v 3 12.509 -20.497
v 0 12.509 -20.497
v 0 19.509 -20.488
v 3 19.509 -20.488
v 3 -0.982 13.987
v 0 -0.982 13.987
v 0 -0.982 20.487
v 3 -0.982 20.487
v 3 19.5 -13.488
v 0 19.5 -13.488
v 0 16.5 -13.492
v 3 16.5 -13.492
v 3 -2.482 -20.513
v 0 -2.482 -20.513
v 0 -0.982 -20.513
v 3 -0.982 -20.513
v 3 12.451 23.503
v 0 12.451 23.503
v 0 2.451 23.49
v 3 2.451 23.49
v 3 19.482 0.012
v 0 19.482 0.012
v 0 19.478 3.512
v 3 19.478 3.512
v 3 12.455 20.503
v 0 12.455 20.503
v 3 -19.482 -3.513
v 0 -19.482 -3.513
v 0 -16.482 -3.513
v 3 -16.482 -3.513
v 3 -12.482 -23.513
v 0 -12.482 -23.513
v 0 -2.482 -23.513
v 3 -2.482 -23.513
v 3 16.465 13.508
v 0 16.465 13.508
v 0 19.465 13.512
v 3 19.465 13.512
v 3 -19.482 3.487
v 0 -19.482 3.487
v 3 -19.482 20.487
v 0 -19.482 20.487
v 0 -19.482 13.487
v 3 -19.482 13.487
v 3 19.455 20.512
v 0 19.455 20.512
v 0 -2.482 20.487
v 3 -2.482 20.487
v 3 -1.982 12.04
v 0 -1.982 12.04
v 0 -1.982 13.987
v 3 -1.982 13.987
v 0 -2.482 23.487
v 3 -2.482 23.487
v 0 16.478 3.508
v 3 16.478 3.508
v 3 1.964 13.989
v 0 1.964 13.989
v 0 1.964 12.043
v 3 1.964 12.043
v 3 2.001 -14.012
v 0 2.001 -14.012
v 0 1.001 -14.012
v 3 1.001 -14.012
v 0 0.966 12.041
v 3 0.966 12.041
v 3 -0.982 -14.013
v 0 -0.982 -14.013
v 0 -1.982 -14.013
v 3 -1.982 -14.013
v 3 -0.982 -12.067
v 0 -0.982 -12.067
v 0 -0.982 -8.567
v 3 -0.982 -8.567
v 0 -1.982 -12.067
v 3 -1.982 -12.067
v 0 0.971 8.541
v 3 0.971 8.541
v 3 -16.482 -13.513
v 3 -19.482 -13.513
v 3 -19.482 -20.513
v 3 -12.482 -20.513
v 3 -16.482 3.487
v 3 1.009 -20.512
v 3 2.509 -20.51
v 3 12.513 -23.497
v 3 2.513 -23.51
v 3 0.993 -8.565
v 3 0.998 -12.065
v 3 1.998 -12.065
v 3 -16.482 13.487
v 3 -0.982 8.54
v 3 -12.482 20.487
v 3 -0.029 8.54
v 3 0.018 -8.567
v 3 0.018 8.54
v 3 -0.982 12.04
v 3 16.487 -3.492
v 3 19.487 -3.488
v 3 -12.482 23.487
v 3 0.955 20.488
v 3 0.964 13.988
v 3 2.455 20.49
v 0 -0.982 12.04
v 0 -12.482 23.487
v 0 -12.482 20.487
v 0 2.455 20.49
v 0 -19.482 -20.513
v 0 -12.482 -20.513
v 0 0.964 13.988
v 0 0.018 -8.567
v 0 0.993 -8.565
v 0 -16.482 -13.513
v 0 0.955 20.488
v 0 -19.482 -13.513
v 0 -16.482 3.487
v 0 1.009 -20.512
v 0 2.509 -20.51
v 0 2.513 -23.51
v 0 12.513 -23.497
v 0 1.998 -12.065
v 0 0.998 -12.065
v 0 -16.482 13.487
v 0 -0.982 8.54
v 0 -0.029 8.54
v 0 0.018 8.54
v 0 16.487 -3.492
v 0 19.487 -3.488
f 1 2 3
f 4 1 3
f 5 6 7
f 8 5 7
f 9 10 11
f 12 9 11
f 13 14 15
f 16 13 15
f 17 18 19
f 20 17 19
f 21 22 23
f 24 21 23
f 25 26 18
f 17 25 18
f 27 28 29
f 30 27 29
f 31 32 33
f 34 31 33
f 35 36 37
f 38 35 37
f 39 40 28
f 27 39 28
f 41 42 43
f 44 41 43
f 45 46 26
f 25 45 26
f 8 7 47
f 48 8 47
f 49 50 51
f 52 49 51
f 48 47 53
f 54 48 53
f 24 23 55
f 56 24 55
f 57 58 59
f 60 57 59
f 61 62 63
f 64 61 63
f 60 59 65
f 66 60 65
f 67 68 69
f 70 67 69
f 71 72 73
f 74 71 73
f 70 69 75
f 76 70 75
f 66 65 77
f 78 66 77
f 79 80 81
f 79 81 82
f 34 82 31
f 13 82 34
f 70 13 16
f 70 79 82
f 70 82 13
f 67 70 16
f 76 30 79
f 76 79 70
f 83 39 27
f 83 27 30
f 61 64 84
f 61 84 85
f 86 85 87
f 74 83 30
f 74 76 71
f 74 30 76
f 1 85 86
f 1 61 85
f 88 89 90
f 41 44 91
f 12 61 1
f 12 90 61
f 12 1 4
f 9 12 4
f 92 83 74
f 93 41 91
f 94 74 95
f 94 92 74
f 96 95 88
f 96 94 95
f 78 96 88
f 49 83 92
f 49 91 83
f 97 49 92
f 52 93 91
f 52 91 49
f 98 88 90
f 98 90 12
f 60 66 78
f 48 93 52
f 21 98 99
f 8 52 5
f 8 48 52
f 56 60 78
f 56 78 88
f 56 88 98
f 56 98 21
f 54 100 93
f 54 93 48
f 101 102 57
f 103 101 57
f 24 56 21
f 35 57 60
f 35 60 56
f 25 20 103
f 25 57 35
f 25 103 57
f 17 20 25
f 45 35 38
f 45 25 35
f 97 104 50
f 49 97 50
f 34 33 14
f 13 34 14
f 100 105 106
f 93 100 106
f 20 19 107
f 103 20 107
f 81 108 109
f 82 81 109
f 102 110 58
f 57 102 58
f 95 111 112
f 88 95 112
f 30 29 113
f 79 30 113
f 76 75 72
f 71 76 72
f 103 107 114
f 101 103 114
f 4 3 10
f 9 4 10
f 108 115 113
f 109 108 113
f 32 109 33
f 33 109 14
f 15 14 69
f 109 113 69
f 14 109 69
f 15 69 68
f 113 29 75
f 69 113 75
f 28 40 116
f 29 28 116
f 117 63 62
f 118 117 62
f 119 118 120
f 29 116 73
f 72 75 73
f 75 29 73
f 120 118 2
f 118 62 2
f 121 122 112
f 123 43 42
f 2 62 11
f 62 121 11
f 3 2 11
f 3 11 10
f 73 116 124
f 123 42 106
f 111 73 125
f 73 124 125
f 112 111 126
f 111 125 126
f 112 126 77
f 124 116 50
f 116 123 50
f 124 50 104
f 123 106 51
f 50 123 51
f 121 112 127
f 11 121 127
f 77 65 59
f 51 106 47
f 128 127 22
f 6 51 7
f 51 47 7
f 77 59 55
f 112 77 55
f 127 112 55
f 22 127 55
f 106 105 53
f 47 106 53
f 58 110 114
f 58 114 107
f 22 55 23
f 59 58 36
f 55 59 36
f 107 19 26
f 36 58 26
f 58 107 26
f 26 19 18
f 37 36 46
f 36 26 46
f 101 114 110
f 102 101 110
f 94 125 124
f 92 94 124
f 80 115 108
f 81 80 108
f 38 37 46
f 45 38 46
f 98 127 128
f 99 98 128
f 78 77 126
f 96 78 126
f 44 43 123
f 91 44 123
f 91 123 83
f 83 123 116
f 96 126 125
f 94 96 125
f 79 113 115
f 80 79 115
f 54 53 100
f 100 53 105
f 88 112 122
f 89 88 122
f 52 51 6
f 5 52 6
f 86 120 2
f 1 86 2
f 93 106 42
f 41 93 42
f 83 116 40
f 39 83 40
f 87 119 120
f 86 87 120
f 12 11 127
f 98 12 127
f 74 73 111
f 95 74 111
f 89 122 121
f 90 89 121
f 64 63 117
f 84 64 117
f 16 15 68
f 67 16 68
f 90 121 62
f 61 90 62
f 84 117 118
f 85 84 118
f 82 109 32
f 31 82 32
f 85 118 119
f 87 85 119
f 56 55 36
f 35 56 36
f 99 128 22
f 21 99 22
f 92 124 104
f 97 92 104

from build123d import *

# Parameters (mm, degrees)
F1_DEPTH = 3


# Not quite as in the source:
# - ends of sketch curves that miss each other by under 0.0002 mm in the source are joined


with BuildPart() as f1:
    # F0 (on Right) → F1 (new body)
    with BuildSketch(Plane.YZ):
        Polygon((-16.4821194199, 3.4866289613), (-19.4821194199, 3.4866289613), (-19.4821194199, -0.0133710387), (-19.4821194199, -3.5133710387), (-16.4821194199, -3.5133710387), (-16.4821194218, -13.5133710387), (-19.4821194199, -13.5133710387), (-19.4821194222, -20.5133710387), (-12.4821194199, -20.5133710387), (-12.4821194214, -23.5133710387), (-2.4821194199, -23.5133710387), (-2.4821194202, -20.5133710387), (-0.9821194199, -20.5133710387), (-0.98211942, -14.0133710387), (-1.9821194199, -14.0133710387), (-1.9821194199, -12.0667160037), (-0.9821194199, -12.0667160037), (-0.98211942, -8.5667160037), (-0.0066117616, -8.5667160037), (0.0178805801, -8.5667160037), (0.9933873842, -8.5654249595), (0.9979620612, -12.0654219699), (1.997962061, -12.0654219699), (2.0005064375, -14.0120753421), (1.0005064375, -14.0120753421), (1.0090022661, -20.5120697898), (2.5090009847, -20.510109214), (2.5129221366, -23.5101066514), (12.5129135944, -23.4970361461), (12.5089924443, -20.4970387087), (19.5089864635, -20.4878893549), (19.499837112, -13.4878953343), (16.4998396723, -13.4918164859), (16.4867691689, -3.4918250278), (19.4867666044, -3.4879038762), (19.4821919275, 0.0120931341), (19.4776172507, 3.5120901445), (16.4776198132, 3.5081689929), (16.4645493098, 13.508160451), (19.4645467453, 13.5120816026), (19.4553973939, 20.5120756232), (12.4554033709, 20.5029262695), (12.4514822208, 23.5029237069), (2.4514907612, 23.4898532016), (2.4554119131, 20.4898557642), (0.9554131941, 20.4878951884), (0.9639090227, 13.9879007406), (1.9639081685, 13.9892077911), (1.9639081683, 12.0425510933), (0.9664533991, 12.0412473684), (0.9710280761, 8.5412503581), (0.0178805401, 8.540004545), (-0.0289710698, 8.5399739263), (-0.9821194199, 8.5399739263), (-0.9821194199, 12.0399739263), (-1.9821194199, 12.0399739263), (-1.9821194199, 13.9866289613), (-0.9821194199, 13.9866289613), (-0.9821194199, 20.4866289613), (-2.4821194199, 20.4866289613), (-2.4821194199, 23.4866289613), (-12.4821194199, 23.4866289613), (-12.4821194199, 20.4866289613), (-19.4821194199, 20.4866289613), (-19.4821194199, 13.4866289613), (-16.4821194199, 13.4866289613), align=None)
    extrude(amount=F1_DEPTH)


solid = f1.part
